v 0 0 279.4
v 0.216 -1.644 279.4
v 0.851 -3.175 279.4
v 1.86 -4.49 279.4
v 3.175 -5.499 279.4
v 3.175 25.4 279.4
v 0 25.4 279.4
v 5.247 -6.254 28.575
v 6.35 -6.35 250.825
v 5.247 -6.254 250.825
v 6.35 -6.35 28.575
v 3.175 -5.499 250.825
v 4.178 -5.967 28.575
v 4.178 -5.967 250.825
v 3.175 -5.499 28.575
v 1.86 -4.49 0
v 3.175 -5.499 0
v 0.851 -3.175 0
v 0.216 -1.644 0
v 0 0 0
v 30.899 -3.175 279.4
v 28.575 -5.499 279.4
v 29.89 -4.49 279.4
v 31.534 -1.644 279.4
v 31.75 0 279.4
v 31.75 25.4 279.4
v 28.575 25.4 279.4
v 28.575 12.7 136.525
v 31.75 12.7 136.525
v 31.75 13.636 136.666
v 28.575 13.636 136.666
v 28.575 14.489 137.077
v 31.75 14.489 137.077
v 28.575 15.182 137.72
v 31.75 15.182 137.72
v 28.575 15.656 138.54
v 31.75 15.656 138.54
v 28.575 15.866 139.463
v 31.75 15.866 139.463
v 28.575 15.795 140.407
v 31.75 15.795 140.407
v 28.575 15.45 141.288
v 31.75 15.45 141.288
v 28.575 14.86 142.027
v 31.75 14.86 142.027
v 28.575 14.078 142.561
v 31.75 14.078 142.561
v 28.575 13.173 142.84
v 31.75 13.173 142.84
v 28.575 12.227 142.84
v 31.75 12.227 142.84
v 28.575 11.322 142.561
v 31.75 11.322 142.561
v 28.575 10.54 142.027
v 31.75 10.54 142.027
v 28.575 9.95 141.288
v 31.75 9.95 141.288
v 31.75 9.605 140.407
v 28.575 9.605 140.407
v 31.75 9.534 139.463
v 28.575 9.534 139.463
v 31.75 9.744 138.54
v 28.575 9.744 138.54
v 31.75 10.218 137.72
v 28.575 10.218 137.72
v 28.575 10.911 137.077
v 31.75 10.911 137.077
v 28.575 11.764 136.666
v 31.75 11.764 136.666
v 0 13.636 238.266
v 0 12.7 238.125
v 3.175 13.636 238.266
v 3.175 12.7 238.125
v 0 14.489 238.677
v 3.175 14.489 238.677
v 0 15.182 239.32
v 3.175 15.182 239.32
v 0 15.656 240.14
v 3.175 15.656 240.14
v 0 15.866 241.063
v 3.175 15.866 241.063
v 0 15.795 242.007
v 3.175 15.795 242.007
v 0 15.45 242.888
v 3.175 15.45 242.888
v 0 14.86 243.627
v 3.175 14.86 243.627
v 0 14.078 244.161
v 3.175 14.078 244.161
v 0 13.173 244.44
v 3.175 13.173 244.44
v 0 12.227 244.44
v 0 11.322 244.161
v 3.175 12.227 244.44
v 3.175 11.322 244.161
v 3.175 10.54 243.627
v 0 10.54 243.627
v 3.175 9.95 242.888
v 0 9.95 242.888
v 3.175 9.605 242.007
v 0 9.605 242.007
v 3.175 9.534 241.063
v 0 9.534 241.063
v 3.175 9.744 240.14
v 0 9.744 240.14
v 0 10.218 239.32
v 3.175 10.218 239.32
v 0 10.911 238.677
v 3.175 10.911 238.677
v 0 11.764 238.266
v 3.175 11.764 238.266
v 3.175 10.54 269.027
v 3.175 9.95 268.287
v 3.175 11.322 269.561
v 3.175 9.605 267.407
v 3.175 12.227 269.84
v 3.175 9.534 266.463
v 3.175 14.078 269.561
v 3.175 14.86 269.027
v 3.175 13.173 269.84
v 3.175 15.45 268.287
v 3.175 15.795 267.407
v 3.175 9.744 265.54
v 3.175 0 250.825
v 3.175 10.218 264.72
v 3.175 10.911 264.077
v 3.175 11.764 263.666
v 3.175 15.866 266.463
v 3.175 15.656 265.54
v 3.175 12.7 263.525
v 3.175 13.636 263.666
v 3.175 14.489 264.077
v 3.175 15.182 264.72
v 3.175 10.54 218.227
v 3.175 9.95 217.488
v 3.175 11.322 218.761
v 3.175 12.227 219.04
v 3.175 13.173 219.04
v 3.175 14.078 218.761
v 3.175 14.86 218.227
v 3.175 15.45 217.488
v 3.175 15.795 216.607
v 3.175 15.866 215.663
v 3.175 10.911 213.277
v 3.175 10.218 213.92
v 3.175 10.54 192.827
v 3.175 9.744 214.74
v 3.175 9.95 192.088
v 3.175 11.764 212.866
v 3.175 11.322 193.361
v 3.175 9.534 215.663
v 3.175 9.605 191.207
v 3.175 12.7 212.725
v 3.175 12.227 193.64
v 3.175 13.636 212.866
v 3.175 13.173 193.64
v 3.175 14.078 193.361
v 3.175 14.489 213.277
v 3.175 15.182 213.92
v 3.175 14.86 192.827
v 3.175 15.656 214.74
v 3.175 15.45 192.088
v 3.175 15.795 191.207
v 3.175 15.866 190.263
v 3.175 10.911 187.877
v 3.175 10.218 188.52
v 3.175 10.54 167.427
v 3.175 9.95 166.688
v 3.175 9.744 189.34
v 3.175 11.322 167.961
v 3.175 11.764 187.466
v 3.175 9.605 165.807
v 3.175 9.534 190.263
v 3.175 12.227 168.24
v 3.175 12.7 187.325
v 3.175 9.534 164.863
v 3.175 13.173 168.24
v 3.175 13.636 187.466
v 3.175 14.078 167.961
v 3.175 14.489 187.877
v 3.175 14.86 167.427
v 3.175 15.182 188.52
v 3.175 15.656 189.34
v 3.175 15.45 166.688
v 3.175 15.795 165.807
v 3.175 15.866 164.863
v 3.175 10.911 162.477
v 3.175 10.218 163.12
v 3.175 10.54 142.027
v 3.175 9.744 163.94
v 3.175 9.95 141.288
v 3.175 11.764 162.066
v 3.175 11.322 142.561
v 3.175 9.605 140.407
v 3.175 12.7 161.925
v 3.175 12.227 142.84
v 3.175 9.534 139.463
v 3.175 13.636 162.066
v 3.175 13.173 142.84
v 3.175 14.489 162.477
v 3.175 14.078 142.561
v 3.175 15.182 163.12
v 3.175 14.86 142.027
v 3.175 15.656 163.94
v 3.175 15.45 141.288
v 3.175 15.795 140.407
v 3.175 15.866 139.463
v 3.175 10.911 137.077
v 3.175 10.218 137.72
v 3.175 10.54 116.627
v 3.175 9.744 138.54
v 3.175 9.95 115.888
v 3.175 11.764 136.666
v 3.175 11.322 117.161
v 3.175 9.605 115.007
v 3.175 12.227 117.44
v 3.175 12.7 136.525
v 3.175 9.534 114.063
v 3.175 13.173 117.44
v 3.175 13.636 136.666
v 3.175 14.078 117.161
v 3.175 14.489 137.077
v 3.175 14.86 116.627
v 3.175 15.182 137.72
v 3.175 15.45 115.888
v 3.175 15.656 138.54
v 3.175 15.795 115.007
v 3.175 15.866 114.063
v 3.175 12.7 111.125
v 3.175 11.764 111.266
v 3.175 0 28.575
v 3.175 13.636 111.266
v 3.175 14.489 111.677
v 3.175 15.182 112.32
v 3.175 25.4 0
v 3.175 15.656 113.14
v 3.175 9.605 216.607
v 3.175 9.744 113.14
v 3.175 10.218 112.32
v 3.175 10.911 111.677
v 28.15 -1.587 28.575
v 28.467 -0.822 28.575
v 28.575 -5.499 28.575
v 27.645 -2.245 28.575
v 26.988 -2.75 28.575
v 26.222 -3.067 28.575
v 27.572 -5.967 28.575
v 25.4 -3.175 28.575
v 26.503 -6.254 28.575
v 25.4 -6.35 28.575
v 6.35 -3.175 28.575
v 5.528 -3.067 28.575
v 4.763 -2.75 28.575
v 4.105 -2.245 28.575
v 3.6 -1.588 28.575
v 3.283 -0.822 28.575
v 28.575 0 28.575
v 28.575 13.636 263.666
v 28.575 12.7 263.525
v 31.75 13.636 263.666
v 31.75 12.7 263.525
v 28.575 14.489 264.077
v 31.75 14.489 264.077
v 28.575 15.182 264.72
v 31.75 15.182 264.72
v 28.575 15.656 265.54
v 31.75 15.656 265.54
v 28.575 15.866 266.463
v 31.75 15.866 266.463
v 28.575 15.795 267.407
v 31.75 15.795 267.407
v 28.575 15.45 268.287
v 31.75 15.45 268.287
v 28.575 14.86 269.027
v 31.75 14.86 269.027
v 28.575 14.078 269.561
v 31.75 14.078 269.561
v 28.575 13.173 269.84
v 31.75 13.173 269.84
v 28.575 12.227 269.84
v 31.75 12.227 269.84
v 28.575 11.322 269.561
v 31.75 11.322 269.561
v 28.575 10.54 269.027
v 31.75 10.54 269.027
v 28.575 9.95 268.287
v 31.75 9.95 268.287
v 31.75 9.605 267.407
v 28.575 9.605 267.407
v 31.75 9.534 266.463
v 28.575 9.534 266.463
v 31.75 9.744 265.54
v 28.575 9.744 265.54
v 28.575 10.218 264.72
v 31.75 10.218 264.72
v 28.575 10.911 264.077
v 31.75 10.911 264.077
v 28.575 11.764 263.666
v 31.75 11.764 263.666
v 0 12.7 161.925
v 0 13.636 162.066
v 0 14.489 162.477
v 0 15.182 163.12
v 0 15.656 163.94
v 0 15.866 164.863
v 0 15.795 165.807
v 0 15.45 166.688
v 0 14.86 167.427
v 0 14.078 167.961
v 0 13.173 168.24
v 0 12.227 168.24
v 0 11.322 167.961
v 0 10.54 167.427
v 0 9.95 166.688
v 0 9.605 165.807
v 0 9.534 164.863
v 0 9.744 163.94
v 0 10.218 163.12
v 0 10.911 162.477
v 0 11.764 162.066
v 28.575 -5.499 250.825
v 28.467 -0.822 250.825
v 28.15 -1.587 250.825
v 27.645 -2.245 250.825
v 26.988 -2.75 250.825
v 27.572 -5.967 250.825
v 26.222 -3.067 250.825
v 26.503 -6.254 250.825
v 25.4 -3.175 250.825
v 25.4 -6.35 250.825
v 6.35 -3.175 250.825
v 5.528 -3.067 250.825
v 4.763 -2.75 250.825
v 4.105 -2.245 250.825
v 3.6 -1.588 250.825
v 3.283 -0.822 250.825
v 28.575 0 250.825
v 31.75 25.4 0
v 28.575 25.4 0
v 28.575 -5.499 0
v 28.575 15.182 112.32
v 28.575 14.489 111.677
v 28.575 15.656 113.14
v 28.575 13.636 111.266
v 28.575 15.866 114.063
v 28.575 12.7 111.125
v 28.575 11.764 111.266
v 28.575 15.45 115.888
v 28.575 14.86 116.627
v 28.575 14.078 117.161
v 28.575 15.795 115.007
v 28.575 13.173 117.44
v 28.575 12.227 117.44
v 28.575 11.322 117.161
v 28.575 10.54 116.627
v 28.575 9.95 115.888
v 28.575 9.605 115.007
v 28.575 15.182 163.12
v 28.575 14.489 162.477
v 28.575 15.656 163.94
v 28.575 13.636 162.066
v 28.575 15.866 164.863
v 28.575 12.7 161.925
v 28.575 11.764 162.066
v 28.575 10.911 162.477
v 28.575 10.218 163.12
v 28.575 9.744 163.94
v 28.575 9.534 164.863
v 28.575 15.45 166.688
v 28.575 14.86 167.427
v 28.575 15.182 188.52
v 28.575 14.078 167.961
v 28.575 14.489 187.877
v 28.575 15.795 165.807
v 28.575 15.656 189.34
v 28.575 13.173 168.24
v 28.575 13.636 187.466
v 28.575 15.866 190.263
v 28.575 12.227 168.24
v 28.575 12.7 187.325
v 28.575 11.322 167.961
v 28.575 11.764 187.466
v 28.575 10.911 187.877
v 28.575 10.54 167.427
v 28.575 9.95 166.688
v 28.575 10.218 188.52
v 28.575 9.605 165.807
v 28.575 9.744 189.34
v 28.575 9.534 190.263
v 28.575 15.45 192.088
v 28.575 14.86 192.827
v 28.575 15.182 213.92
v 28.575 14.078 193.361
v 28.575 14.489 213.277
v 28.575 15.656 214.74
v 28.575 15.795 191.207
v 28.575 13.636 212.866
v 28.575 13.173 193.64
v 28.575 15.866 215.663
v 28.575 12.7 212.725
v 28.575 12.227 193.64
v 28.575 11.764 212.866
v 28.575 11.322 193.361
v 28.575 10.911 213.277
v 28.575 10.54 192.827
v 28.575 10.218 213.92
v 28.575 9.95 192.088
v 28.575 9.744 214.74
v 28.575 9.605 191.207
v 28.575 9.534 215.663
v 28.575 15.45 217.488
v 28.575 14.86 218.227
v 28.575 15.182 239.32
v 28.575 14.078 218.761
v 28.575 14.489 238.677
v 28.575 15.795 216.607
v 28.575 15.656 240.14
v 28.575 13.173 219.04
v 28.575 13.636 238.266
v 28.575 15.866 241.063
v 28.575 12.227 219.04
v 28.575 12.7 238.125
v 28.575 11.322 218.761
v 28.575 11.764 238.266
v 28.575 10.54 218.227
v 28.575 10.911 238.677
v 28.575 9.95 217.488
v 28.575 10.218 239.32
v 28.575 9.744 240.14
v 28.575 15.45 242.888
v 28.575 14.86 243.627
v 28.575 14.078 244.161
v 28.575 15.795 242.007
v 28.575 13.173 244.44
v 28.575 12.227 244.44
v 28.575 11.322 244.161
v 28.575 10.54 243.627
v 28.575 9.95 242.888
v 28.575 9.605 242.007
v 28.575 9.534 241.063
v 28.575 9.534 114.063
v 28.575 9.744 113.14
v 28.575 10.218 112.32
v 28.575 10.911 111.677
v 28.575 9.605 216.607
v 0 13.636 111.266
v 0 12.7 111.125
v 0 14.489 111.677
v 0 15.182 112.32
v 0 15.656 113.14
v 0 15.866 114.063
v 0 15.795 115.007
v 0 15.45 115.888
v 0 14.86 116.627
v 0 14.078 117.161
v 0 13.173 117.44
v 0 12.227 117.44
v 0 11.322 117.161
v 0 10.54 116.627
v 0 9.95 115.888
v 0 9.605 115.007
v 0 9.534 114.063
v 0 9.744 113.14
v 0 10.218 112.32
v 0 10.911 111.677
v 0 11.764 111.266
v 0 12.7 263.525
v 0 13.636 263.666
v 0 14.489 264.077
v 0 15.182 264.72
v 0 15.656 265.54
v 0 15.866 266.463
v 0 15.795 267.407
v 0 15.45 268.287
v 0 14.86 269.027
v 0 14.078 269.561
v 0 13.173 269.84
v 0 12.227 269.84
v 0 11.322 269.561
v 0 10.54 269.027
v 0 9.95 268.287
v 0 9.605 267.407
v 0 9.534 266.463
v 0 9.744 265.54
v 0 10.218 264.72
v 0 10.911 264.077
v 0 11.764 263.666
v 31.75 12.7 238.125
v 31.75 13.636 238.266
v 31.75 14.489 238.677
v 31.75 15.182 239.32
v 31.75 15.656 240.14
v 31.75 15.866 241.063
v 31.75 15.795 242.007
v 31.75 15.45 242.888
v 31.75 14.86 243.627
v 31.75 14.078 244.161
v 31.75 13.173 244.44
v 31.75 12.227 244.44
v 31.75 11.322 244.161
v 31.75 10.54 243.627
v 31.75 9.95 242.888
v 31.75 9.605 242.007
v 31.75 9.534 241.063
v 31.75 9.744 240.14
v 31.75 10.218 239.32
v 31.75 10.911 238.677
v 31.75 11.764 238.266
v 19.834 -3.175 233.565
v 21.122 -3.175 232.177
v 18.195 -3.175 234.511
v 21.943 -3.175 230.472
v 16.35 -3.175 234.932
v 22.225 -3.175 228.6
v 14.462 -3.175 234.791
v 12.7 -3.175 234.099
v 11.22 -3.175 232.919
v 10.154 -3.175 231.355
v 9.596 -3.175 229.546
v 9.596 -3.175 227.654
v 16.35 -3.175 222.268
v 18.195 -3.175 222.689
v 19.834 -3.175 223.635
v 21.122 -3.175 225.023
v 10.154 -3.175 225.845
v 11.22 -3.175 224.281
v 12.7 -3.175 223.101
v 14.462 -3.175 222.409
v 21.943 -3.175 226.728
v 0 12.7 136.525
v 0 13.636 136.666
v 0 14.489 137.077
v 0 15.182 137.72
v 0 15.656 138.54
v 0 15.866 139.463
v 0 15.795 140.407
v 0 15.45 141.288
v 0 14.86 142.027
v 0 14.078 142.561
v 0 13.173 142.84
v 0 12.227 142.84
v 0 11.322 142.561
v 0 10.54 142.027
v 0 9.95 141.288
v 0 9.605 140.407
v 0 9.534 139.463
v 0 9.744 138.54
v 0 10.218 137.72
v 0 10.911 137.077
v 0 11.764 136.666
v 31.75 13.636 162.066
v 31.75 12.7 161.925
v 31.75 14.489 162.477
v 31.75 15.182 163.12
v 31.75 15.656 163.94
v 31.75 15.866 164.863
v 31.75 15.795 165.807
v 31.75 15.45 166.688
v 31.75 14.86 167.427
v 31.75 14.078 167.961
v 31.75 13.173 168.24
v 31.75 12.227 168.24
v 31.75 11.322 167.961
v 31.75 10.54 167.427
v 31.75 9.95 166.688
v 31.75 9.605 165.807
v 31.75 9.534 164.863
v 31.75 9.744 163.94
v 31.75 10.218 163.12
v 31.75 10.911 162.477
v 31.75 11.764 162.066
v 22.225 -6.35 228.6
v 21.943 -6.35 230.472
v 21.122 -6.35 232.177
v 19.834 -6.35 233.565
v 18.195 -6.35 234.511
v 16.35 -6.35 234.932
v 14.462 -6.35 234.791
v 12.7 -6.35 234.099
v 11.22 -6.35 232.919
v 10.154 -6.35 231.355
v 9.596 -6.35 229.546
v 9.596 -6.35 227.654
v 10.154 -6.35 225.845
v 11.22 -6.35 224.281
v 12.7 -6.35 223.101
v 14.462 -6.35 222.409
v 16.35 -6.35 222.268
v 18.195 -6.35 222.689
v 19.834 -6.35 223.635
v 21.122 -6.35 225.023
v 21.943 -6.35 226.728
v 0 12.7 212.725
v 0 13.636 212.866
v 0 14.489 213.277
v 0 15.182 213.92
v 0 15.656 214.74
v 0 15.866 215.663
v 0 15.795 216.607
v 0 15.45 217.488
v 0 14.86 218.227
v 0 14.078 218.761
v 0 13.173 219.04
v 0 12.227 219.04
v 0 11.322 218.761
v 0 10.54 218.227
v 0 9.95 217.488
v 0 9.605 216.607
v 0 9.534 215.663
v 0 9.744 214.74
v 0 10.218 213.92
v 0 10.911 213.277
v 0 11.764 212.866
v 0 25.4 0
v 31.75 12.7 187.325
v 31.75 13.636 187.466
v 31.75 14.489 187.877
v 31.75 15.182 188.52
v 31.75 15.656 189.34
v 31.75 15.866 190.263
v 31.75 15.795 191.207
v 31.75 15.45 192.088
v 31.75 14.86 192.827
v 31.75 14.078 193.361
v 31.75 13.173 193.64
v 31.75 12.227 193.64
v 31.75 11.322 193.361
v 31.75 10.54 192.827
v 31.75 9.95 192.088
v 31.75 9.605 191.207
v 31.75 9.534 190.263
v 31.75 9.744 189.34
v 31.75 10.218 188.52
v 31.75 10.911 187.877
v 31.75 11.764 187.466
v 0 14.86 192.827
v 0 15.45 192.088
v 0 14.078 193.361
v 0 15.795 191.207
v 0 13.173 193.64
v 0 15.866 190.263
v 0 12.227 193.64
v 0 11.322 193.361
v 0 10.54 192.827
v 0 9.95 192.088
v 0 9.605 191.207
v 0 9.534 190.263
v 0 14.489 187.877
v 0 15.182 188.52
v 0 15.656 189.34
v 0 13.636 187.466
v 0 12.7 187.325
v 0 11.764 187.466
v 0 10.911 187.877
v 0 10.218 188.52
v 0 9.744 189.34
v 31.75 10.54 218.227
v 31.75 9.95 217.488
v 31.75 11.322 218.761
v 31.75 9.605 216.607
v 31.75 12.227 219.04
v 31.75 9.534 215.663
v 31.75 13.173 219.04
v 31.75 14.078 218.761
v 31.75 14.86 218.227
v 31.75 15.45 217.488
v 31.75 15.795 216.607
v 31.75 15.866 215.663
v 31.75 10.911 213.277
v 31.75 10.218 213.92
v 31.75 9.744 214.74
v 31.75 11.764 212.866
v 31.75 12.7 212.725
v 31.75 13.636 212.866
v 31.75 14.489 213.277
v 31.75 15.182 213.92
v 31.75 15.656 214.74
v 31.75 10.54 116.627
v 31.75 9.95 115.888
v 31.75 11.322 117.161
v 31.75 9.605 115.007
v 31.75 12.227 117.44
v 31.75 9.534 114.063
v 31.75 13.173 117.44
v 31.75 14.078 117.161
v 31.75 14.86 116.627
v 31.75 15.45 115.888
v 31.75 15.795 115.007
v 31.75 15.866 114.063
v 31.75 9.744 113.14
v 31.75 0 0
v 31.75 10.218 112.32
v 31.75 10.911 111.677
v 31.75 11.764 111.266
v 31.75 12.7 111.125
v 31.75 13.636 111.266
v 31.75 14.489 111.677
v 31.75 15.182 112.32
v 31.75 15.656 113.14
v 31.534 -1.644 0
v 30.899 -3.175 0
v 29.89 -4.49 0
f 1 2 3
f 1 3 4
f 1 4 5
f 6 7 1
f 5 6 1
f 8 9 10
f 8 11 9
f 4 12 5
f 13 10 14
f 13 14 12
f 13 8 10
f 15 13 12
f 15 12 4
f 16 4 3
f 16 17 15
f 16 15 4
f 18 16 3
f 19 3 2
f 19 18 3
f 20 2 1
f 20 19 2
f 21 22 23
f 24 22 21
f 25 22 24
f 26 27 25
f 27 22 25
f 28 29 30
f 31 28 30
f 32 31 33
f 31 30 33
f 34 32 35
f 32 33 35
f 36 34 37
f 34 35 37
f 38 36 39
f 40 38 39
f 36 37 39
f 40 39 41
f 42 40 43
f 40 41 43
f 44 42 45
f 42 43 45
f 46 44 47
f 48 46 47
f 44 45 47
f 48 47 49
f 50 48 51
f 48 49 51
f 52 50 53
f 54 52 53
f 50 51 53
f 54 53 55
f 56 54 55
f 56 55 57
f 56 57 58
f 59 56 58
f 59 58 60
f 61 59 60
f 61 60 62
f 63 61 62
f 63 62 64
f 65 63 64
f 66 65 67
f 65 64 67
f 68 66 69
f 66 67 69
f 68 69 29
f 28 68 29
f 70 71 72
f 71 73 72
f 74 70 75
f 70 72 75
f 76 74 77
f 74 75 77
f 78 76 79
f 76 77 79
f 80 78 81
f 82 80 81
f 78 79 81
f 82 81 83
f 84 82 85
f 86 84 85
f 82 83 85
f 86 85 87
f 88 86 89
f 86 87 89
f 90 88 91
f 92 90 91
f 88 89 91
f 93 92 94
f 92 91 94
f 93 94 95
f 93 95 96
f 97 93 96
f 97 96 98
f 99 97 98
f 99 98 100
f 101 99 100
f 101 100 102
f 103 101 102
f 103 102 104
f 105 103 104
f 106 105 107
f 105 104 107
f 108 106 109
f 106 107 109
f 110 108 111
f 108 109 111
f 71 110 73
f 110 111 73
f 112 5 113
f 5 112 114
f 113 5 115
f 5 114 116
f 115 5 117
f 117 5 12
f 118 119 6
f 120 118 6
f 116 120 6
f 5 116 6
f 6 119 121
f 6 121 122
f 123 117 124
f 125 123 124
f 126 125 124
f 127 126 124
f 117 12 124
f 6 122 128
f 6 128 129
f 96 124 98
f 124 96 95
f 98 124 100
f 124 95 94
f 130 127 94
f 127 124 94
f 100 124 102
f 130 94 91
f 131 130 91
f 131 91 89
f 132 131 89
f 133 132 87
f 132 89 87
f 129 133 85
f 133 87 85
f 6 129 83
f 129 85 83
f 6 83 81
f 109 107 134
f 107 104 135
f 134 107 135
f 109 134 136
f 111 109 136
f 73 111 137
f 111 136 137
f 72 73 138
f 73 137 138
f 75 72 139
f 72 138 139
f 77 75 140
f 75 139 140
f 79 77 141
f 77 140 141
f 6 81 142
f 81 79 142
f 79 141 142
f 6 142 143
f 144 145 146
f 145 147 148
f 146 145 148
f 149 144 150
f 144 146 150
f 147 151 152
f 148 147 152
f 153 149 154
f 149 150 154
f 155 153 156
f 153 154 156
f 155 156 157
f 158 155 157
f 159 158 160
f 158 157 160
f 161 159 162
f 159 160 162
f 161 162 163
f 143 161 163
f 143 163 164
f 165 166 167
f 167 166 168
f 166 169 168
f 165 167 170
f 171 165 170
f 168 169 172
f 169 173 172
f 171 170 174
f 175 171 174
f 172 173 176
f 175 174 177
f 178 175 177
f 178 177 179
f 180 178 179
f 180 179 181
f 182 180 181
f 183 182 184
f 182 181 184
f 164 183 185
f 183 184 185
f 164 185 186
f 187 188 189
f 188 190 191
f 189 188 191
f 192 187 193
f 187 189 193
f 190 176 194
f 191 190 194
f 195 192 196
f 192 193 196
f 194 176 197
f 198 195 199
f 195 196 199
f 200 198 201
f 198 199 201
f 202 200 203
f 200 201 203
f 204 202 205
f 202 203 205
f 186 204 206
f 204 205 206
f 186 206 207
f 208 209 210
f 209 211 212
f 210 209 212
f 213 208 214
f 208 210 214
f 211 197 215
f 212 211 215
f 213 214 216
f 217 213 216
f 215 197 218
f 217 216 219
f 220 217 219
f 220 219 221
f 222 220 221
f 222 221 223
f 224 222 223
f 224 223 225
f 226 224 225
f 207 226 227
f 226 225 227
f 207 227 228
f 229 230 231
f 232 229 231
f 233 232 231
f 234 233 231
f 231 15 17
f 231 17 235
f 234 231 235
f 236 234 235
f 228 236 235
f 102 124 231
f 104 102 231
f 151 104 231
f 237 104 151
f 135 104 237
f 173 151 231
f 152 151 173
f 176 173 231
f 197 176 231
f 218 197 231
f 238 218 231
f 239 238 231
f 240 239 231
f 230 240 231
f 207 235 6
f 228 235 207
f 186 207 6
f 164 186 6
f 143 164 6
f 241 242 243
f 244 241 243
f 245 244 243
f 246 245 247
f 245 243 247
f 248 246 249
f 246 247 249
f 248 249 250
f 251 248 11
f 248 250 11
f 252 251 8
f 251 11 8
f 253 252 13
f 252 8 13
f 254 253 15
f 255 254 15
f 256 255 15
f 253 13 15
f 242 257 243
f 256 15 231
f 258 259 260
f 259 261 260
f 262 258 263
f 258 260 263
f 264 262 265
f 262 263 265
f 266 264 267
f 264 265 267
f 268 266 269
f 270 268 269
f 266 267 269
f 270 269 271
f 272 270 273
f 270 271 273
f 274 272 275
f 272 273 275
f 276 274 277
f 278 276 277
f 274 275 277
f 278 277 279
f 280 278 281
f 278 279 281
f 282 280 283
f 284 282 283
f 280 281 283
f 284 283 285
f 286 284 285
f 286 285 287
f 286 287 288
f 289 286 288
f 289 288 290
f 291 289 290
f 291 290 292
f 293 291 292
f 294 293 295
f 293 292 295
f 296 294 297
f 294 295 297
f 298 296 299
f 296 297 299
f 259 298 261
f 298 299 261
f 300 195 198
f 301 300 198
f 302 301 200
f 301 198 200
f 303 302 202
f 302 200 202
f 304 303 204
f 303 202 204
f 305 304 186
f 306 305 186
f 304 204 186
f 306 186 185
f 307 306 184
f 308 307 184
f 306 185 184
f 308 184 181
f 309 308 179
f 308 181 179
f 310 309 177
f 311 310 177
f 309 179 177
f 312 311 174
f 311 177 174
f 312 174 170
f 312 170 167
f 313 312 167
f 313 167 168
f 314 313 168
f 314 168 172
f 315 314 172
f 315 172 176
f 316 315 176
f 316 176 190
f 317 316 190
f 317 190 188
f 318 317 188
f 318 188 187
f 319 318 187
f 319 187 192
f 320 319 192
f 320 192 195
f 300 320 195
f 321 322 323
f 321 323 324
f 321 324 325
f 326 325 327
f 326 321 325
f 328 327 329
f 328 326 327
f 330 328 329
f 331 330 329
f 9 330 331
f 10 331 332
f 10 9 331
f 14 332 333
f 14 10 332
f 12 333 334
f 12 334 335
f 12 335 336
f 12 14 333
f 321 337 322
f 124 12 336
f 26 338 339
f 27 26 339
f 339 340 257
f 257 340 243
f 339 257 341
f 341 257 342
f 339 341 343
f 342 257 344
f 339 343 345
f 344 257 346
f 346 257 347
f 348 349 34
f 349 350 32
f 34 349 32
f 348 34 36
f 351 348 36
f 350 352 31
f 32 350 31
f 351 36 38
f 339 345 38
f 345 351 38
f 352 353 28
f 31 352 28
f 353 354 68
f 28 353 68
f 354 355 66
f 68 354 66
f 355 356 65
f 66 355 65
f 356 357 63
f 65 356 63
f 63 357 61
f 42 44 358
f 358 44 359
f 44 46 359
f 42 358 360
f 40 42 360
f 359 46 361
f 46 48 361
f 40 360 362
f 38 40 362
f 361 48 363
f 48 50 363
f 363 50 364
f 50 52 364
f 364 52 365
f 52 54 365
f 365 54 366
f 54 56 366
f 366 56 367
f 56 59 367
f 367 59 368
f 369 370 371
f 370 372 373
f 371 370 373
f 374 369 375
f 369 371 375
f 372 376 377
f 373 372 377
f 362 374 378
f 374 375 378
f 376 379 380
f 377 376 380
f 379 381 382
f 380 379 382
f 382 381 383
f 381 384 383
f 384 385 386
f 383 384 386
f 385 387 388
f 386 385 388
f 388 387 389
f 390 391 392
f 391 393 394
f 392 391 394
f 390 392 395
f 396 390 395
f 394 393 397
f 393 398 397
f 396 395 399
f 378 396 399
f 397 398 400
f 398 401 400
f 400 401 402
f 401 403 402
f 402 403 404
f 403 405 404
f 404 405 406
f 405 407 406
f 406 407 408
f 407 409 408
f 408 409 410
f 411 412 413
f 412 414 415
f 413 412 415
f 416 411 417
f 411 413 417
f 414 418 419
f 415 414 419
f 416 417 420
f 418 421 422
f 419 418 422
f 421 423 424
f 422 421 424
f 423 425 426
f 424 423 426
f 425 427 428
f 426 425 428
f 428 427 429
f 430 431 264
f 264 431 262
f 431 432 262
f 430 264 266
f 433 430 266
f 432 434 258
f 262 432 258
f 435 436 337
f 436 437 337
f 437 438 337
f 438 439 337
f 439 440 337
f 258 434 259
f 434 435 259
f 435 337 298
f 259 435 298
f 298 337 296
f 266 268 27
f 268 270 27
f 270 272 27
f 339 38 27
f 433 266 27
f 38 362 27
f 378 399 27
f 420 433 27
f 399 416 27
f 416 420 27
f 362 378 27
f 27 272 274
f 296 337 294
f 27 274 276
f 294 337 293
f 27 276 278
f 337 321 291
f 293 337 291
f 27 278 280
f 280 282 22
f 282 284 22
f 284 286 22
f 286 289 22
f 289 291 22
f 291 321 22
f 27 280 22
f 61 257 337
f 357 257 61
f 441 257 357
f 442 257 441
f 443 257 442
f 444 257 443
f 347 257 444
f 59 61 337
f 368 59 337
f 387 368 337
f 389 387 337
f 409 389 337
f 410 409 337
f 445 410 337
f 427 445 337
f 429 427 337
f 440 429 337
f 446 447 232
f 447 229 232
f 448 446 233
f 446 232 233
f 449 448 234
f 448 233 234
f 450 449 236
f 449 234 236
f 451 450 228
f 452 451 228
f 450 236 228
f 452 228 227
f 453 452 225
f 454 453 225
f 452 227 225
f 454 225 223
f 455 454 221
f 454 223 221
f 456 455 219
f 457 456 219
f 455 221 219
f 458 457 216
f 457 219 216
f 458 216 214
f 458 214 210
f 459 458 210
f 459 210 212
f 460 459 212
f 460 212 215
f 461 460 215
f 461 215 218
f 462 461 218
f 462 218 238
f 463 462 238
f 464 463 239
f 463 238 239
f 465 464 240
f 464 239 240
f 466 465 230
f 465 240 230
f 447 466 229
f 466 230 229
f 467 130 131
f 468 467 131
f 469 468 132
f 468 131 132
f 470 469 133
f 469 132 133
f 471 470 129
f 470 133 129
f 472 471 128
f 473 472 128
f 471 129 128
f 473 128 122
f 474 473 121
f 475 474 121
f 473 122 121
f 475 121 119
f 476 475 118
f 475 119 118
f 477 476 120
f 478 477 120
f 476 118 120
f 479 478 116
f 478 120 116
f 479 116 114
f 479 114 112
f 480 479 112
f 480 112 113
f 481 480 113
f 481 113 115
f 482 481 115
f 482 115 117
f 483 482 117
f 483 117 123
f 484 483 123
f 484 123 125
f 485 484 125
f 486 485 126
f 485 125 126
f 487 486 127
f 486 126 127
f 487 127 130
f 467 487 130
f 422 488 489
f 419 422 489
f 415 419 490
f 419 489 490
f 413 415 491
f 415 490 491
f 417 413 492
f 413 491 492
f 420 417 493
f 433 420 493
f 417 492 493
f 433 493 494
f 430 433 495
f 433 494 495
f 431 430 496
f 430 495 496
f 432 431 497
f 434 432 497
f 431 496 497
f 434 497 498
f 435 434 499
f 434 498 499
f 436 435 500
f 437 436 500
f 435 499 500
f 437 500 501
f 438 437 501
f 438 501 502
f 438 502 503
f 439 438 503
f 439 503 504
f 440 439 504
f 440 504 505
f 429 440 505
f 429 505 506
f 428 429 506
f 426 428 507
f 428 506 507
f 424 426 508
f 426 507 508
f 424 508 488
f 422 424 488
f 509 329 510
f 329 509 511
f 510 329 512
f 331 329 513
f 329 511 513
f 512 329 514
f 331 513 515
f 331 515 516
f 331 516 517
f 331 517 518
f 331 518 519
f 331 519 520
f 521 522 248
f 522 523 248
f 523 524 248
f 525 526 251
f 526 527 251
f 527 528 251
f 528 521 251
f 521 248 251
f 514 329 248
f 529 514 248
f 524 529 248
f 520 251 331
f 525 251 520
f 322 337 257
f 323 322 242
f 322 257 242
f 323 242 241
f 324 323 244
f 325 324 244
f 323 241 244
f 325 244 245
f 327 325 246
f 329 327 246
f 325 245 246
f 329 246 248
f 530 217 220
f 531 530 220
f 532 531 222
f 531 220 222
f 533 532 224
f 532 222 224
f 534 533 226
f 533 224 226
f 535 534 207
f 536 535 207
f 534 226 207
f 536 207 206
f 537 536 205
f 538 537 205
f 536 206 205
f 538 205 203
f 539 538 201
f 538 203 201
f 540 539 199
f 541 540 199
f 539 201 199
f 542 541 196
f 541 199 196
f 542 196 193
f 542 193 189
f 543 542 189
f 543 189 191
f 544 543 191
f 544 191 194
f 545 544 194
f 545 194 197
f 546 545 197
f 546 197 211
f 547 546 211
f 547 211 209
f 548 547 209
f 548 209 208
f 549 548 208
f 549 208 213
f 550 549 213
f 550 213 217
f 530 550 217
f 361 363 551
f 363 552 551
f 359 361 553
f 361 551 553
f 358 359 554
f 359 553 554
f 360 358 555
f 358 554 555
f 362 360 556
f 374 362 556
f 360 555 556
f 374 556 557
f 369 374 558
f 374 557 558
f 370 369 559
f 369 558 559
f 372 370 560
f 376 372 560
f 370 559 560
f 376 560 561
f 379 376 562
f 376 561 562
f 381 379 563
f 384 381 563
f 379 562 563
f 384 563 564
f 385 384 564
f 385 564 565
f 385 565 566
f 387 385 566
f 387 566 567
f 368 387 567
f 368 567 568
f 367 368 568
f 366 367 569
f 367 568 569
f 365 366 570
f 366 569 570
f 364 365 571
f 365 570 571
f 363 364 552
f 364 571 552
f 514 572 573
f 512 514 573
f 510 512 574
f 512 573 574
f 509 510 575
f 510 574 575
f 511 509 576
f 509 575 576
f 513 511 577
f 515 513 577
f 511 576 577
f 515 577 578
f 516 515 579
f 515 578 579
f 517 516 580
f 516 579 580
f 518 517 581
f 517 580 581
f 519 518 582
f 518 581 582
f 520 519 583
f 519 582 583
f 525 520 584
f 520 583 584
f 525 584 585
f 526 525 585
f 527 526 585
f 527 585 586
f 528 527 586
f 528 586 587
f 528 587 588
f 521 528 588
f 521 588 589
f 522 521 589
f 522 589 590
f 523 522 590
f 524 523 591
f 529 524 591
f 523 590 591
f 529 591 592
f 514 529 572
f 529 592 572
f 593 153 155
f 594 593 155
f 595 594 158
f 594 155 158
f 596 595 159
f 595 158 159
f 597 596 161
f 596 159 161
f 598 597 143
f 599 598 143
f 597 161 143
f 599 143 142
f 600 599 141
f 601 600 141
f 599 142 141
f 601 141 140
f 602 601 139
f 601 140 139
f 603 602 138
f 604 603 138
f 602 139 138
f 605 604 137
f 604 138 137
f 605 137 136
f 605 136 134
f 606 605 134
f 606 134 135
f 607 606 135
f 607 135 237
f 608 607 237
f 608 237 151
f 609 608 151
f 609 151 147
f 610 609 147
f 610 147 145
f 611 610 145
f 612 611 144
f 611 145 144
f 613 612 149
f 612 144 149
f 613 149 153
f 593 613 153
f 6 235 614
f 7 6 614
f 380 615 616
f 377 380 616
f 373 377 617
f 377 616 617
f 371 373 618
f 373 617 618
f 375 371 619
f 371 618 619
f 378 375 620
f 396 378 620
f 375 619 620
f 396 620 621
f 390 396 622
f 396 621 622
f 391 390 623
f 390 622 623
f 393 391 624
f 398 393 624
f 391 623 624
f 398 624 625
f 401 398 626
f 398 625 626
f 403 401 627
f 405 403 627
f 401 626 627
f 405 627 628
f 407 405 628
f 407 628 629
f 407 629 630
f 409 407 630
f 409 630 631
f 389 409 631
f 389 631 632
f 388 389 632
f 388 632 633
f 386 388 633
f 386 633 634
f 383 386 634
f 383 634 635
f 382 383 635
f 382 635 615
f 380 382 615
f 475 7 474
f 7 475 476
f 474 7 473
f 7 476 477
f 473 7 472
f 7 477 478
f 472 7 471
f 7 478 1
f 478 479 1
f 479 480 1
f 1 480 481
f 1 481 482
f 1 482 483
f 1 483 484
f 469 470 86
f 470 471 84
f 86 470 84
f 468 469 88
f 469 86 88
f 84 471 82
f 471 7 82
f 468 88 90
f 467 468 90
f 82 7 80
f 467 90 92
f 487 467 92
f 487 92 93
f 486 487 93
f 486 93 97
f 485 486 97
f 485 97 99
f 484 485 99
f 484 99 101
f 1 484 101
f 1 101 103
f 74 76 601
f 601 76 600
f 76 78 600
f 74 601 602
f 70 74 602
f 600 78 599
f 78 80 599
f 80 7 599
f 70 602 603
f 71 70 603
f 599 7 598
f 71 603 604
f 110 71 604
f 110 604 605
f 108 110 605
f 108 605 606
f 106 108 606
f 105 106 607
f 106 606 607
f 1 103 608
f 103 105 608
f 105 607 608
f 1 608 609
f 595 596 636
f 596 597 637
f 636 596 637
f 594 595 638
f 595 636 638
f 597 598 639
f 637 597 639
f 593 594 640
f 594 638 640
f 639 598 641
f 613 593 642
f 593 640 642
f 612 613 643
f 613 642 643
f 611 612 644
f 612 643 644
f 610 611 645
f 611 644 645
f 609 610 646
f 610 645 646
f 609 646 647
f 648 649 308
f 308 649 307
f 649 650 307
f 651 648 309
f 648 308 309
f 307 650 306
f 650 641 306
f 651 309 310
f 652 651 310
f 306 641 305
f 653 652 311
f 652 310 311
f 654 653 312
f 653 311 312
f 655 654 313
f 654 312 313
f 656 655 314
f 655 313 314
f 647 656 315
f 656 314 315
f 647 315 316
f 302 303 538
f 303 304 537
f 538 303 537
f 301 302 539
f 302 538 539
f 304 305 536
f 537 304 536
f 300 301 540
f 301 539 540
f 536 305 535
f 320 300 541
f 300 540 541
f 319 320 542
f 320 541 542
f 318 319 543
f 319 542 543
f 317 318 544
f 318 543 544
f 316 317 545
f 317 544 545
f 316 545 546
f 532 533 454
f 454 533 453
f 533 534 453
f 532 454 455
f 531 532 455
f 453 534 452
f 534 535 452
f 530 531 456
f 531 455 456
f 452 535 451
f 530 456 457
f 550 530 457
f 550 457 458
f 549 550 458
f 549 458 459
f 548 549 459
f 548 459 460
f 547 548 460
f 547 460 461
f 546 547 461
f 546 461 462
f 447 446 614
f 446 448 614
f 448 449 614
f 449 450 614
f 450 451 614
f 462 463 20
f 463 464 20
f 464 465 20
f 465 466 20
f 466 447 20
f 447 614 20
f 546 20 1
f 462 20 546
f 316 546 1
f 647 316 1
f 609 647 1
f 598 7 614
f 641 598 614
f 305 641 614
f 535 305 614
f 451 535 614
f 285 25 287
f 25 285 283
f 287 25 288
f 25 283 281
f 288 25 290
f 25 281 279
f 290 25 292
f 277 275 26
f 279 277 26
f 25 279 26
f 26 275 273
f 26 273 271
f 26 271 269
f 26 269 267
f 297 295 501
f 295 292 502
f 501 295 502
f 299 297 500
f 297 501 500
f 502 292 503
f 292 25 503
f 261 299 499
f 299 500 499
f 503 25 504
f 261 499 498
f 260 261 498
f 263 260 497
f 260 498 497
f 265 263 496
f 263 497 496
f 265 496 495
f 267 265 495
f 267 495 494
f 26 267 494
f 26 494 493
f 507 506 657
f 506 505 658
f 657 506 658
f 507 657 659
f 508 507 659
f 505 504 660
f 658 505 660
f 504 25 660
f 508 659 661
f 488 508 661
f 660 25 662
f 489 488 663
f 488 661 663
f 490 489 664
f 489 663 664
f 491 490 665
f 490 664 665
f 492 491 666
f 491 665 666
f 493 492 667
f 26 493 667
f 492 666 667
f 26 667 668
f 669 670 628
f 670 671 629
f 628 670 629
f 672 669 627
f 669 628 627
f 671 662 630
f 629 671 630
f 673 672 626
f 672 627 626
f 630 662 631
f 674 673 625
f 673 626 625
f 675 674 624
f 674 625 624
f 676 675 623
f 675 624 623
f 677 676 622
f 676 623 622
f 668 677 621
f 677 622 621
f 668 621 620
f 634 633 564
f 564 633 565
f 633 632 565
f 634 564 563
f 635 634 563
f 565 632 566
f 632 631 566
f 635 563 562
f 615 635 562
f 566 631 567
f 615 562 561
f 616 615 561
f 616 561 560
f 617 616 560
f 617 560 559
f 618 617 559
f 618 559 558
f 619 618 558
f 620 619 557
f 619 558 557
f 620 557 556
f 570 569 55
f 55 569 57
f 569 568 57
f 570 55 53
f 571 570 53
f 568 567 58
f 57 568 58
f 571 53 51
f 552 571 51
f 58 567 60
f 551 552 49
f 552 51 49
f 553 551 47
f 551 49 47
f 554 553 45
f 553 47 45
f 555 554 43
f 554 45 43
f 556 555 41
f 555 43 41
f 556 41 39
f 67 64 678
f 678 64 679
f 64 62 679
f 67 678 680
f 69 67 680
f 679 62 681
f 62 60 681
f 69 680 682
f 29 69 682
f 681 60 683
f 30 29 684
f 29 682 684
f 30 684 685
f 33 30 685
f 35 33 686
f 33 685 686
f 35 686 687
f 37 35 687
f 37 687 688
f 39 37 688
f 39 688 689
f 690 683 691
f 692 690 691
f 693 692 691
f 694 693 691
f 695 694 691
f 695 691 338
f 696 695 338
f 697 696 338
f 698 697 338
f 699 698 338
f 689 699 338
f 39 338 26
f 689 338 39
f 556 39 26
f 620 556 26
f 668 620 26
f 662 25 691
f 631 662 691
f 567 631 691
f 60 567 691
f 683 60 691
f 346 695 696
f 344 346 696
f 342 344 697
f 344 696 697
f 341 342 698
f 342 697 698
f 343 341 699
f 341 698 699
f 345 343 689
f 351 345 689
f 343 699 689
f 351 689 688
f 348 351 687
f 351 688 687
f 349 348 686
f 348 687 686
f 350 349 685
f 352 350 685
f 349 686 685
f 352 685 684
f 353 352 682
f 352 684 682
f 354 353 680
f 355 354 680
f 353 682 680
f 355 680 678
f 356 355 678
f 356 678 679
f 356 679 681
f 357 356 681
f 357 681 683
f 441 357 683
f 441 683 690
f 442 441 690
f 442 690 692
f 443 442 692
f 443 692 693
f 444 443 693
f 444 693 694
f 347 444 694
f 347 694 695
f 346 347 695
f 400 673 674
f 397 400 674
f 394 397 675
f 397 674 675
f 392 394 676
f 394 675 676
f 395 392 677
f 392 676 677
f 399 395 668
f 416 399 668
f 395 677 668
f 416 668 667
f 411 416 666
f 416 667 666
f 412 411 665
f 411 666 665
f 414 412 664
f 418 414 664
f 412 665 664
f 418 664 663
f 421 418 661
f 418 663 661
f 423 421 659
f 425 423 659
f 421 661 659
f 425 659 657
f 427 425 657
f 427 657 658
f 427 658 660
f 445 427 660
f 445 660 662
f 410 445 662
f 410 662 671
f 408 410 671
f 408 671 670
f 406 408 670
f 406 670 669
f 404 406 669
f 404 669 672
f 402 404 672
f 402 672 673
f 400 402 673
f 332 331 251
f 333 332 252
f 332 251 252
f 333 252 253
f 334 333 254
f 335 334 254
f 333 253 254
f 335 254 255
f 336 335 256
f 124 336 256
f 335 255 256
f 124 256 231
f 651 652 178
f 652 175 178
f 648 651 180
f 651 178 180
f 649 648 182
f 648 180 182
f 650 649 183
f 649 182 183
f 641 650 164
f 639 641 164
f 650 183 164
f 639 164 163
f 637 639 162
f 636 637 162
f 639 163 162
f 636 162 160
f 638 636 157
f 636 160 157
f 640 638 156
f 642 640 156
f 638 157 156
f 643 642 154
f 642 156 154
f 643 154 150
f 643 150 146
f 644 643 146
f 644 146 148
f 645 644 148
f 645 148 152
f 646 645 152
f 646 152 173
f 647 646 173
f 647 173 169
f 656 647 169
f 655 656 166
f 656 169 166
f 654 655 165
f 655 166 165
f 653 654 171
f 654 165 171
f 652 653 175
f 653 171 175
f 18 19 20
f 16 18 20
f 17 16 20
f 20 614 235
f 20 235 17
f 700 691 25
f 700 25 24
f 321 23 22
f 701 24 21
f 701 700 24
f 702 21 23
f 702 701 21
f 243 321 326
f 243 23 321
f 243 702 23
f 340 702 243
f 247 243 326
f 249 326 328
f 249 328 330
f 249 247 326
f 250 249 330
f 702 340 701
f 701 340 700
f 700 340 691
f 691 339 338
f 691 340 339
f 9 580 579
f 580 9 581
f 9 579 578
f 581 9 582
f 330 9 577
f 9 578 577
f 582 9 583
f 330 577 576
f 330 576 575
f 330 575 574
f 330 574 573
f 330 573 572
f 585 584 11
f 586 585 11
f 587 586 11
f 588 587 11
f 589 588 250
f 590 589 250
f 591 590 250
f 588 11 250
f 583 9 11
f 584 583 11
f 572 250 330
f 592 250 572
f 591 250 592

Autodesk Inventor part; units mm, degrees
ref_plane "YZ Plane" through (0, 0, 0) normal (1, 0, 0) x (0, 1, 0)
ref_plane "XZ Plane" through (0, 0, 0) normal (0, 1, 0) x (-1, 0, 0)
ref_plane "XY Plane" through (0, 0, 0) normal (0, 0, 1) x (1, 0, 0)
sketch "Sketch1" plane through (0, 0, 0) normal (0, 0, 1) x (1, 0, 0)
  line L0 (0, 25.4) -> (0, 0)
  line L1 (6.35, -6.35) -> (25.4, -6.35)
  line L2 (31.75, 0) -> (31.75, 25.4)
  line L3 (31.75, 25.4) -> (28.575, 25.4)
  line L4 (28.575, 25.4) -> (28.575, 0)
  line L5 (25.4, -3.175) -> (6.35, -3.175)
  line L6 (3.175, 0) -> (3.175, 25.4)
  line L7 (3.175, 25.4) -> (0, 25.4)
  arc A0 (3.175, 0) -> (6.35, -3.175) centre (6.35, 0) ccw
  arc A1 (0, 0) -> (6.35, -6.35) centre (6.35, 0) ccw
  arc A2 (25.4, -3.175) -> (28.575, 0) centre (25.4, 0) ccw
  arc A3 (25.4, -6.35) -> (31.75, 0) centre (25.4, 0) ccw
  dimension "d0" = 3.175
  dimension "d1" = 25.4
  dimension "d2" = 25.4
  dimension "d3" = 3.175
extrude "Extrusion1" add sketch "Sketch1" along normal blind 279.4
sketch "Sketch2" plane through (31.75, 0, 0) normal (1, 0, 0) x (0, 0, -1)
  line L0 (-279.4, 25.4) -> (-279.4, 0) projected
  line L1 (0, 25.4) -> (-279.4, 25.4) projected
  circle A0 centre (-266.7, 12.7) radius 3.175
  dimension "d6" = 6.35
  dimension "d7" = 12.7
  dimension "d8" = 12.7
extrude "Extrusion2" cut sketch "Sketch2" against normal through all
pattern_linear "Rectangular Pattern1" count 7 spacing 25.4 along (0, 0, -1) of "Extrusion2"
sketch "Sketch3" plane through (6.35, -6.35, 0) normal (0, -1, 0) x (1, 0, 0)
  line L0 (19.05, 279.4) -> (0, 279.4) projected
  circle A0 centre (9.525, 228.6) radius 6.35
  point P0 (-6.35, 0)
  dimension "d14" = 12.7
  dimension "d15" = 50.8
extrude "Extrusion3" cut sketch "Sketch3" against normal up to next
sketch "Sketch4" plane through (6.35, -6.35, 0) normal (0, -1, 0) x (1, 0, 0)
  line L0 (19.05, 279.4) -> (0, 279.4) projected
  line L1 (0, 0) -> (0, 279.4) projected
  line L2 (0, 0) -> (19.05, 0) projected
  line L3 (19.05, 0) -> (19.05, 279.4) projected
  line L4 (-3.175, 279.4) -> (22.225, 279.4)
  line L5 (22.225, 279.4) -> (22.225, 250.825)
  line L6 (22.225, 250.825) -> (-3.175, 250.825)
  line L7 (-3.175, 250.825) -> (-3.175, 279.4)
  line L8 (-3.175, 165.9576) -> (0, 165.9576) construction
  line L9 (19.05, 165.9576) -> (22.225, 165.9576) construction
  line L10 (-3.175, 0) -> (22.225, 0)
  line L11 (22.225, 0) -> (22.225, 28.575)
  line L12 (22.225, 28.575) -> (-3.175, 28.575)
  line L13 (-3.175, 28.575) -> (-3.175, 0)
  line L14 (-6.35, 279.4) -> (-3.175, 279.4)
  line L15 (-3.175, 279.4) -> (-3.175, 250.825)
  line L16 (-3.175, 250.825) -> (-6.35, 250.825)
  line L17 (-6.35, 250.825) -> (-6.35, 279.4)
  point P0 (-6.35, 0)
  dimension "d18" = 25.4
  dimension "d19" = 28.575
  dimension "d20" = 0
  dimension "d21" = 0
extrude "Extrusion4" cut sketch "Sketch4" against normal through all contours L3 L6 L1 L0 | L4 L5 L6 L3 | L1 L6 L7 L4 | L12 L11 L10 L3 | L3 L2 L1 L12 | L1 L10 L13 L12
properties part number "Frame_OuterConveyorMount" material "Aluminum-6061"
